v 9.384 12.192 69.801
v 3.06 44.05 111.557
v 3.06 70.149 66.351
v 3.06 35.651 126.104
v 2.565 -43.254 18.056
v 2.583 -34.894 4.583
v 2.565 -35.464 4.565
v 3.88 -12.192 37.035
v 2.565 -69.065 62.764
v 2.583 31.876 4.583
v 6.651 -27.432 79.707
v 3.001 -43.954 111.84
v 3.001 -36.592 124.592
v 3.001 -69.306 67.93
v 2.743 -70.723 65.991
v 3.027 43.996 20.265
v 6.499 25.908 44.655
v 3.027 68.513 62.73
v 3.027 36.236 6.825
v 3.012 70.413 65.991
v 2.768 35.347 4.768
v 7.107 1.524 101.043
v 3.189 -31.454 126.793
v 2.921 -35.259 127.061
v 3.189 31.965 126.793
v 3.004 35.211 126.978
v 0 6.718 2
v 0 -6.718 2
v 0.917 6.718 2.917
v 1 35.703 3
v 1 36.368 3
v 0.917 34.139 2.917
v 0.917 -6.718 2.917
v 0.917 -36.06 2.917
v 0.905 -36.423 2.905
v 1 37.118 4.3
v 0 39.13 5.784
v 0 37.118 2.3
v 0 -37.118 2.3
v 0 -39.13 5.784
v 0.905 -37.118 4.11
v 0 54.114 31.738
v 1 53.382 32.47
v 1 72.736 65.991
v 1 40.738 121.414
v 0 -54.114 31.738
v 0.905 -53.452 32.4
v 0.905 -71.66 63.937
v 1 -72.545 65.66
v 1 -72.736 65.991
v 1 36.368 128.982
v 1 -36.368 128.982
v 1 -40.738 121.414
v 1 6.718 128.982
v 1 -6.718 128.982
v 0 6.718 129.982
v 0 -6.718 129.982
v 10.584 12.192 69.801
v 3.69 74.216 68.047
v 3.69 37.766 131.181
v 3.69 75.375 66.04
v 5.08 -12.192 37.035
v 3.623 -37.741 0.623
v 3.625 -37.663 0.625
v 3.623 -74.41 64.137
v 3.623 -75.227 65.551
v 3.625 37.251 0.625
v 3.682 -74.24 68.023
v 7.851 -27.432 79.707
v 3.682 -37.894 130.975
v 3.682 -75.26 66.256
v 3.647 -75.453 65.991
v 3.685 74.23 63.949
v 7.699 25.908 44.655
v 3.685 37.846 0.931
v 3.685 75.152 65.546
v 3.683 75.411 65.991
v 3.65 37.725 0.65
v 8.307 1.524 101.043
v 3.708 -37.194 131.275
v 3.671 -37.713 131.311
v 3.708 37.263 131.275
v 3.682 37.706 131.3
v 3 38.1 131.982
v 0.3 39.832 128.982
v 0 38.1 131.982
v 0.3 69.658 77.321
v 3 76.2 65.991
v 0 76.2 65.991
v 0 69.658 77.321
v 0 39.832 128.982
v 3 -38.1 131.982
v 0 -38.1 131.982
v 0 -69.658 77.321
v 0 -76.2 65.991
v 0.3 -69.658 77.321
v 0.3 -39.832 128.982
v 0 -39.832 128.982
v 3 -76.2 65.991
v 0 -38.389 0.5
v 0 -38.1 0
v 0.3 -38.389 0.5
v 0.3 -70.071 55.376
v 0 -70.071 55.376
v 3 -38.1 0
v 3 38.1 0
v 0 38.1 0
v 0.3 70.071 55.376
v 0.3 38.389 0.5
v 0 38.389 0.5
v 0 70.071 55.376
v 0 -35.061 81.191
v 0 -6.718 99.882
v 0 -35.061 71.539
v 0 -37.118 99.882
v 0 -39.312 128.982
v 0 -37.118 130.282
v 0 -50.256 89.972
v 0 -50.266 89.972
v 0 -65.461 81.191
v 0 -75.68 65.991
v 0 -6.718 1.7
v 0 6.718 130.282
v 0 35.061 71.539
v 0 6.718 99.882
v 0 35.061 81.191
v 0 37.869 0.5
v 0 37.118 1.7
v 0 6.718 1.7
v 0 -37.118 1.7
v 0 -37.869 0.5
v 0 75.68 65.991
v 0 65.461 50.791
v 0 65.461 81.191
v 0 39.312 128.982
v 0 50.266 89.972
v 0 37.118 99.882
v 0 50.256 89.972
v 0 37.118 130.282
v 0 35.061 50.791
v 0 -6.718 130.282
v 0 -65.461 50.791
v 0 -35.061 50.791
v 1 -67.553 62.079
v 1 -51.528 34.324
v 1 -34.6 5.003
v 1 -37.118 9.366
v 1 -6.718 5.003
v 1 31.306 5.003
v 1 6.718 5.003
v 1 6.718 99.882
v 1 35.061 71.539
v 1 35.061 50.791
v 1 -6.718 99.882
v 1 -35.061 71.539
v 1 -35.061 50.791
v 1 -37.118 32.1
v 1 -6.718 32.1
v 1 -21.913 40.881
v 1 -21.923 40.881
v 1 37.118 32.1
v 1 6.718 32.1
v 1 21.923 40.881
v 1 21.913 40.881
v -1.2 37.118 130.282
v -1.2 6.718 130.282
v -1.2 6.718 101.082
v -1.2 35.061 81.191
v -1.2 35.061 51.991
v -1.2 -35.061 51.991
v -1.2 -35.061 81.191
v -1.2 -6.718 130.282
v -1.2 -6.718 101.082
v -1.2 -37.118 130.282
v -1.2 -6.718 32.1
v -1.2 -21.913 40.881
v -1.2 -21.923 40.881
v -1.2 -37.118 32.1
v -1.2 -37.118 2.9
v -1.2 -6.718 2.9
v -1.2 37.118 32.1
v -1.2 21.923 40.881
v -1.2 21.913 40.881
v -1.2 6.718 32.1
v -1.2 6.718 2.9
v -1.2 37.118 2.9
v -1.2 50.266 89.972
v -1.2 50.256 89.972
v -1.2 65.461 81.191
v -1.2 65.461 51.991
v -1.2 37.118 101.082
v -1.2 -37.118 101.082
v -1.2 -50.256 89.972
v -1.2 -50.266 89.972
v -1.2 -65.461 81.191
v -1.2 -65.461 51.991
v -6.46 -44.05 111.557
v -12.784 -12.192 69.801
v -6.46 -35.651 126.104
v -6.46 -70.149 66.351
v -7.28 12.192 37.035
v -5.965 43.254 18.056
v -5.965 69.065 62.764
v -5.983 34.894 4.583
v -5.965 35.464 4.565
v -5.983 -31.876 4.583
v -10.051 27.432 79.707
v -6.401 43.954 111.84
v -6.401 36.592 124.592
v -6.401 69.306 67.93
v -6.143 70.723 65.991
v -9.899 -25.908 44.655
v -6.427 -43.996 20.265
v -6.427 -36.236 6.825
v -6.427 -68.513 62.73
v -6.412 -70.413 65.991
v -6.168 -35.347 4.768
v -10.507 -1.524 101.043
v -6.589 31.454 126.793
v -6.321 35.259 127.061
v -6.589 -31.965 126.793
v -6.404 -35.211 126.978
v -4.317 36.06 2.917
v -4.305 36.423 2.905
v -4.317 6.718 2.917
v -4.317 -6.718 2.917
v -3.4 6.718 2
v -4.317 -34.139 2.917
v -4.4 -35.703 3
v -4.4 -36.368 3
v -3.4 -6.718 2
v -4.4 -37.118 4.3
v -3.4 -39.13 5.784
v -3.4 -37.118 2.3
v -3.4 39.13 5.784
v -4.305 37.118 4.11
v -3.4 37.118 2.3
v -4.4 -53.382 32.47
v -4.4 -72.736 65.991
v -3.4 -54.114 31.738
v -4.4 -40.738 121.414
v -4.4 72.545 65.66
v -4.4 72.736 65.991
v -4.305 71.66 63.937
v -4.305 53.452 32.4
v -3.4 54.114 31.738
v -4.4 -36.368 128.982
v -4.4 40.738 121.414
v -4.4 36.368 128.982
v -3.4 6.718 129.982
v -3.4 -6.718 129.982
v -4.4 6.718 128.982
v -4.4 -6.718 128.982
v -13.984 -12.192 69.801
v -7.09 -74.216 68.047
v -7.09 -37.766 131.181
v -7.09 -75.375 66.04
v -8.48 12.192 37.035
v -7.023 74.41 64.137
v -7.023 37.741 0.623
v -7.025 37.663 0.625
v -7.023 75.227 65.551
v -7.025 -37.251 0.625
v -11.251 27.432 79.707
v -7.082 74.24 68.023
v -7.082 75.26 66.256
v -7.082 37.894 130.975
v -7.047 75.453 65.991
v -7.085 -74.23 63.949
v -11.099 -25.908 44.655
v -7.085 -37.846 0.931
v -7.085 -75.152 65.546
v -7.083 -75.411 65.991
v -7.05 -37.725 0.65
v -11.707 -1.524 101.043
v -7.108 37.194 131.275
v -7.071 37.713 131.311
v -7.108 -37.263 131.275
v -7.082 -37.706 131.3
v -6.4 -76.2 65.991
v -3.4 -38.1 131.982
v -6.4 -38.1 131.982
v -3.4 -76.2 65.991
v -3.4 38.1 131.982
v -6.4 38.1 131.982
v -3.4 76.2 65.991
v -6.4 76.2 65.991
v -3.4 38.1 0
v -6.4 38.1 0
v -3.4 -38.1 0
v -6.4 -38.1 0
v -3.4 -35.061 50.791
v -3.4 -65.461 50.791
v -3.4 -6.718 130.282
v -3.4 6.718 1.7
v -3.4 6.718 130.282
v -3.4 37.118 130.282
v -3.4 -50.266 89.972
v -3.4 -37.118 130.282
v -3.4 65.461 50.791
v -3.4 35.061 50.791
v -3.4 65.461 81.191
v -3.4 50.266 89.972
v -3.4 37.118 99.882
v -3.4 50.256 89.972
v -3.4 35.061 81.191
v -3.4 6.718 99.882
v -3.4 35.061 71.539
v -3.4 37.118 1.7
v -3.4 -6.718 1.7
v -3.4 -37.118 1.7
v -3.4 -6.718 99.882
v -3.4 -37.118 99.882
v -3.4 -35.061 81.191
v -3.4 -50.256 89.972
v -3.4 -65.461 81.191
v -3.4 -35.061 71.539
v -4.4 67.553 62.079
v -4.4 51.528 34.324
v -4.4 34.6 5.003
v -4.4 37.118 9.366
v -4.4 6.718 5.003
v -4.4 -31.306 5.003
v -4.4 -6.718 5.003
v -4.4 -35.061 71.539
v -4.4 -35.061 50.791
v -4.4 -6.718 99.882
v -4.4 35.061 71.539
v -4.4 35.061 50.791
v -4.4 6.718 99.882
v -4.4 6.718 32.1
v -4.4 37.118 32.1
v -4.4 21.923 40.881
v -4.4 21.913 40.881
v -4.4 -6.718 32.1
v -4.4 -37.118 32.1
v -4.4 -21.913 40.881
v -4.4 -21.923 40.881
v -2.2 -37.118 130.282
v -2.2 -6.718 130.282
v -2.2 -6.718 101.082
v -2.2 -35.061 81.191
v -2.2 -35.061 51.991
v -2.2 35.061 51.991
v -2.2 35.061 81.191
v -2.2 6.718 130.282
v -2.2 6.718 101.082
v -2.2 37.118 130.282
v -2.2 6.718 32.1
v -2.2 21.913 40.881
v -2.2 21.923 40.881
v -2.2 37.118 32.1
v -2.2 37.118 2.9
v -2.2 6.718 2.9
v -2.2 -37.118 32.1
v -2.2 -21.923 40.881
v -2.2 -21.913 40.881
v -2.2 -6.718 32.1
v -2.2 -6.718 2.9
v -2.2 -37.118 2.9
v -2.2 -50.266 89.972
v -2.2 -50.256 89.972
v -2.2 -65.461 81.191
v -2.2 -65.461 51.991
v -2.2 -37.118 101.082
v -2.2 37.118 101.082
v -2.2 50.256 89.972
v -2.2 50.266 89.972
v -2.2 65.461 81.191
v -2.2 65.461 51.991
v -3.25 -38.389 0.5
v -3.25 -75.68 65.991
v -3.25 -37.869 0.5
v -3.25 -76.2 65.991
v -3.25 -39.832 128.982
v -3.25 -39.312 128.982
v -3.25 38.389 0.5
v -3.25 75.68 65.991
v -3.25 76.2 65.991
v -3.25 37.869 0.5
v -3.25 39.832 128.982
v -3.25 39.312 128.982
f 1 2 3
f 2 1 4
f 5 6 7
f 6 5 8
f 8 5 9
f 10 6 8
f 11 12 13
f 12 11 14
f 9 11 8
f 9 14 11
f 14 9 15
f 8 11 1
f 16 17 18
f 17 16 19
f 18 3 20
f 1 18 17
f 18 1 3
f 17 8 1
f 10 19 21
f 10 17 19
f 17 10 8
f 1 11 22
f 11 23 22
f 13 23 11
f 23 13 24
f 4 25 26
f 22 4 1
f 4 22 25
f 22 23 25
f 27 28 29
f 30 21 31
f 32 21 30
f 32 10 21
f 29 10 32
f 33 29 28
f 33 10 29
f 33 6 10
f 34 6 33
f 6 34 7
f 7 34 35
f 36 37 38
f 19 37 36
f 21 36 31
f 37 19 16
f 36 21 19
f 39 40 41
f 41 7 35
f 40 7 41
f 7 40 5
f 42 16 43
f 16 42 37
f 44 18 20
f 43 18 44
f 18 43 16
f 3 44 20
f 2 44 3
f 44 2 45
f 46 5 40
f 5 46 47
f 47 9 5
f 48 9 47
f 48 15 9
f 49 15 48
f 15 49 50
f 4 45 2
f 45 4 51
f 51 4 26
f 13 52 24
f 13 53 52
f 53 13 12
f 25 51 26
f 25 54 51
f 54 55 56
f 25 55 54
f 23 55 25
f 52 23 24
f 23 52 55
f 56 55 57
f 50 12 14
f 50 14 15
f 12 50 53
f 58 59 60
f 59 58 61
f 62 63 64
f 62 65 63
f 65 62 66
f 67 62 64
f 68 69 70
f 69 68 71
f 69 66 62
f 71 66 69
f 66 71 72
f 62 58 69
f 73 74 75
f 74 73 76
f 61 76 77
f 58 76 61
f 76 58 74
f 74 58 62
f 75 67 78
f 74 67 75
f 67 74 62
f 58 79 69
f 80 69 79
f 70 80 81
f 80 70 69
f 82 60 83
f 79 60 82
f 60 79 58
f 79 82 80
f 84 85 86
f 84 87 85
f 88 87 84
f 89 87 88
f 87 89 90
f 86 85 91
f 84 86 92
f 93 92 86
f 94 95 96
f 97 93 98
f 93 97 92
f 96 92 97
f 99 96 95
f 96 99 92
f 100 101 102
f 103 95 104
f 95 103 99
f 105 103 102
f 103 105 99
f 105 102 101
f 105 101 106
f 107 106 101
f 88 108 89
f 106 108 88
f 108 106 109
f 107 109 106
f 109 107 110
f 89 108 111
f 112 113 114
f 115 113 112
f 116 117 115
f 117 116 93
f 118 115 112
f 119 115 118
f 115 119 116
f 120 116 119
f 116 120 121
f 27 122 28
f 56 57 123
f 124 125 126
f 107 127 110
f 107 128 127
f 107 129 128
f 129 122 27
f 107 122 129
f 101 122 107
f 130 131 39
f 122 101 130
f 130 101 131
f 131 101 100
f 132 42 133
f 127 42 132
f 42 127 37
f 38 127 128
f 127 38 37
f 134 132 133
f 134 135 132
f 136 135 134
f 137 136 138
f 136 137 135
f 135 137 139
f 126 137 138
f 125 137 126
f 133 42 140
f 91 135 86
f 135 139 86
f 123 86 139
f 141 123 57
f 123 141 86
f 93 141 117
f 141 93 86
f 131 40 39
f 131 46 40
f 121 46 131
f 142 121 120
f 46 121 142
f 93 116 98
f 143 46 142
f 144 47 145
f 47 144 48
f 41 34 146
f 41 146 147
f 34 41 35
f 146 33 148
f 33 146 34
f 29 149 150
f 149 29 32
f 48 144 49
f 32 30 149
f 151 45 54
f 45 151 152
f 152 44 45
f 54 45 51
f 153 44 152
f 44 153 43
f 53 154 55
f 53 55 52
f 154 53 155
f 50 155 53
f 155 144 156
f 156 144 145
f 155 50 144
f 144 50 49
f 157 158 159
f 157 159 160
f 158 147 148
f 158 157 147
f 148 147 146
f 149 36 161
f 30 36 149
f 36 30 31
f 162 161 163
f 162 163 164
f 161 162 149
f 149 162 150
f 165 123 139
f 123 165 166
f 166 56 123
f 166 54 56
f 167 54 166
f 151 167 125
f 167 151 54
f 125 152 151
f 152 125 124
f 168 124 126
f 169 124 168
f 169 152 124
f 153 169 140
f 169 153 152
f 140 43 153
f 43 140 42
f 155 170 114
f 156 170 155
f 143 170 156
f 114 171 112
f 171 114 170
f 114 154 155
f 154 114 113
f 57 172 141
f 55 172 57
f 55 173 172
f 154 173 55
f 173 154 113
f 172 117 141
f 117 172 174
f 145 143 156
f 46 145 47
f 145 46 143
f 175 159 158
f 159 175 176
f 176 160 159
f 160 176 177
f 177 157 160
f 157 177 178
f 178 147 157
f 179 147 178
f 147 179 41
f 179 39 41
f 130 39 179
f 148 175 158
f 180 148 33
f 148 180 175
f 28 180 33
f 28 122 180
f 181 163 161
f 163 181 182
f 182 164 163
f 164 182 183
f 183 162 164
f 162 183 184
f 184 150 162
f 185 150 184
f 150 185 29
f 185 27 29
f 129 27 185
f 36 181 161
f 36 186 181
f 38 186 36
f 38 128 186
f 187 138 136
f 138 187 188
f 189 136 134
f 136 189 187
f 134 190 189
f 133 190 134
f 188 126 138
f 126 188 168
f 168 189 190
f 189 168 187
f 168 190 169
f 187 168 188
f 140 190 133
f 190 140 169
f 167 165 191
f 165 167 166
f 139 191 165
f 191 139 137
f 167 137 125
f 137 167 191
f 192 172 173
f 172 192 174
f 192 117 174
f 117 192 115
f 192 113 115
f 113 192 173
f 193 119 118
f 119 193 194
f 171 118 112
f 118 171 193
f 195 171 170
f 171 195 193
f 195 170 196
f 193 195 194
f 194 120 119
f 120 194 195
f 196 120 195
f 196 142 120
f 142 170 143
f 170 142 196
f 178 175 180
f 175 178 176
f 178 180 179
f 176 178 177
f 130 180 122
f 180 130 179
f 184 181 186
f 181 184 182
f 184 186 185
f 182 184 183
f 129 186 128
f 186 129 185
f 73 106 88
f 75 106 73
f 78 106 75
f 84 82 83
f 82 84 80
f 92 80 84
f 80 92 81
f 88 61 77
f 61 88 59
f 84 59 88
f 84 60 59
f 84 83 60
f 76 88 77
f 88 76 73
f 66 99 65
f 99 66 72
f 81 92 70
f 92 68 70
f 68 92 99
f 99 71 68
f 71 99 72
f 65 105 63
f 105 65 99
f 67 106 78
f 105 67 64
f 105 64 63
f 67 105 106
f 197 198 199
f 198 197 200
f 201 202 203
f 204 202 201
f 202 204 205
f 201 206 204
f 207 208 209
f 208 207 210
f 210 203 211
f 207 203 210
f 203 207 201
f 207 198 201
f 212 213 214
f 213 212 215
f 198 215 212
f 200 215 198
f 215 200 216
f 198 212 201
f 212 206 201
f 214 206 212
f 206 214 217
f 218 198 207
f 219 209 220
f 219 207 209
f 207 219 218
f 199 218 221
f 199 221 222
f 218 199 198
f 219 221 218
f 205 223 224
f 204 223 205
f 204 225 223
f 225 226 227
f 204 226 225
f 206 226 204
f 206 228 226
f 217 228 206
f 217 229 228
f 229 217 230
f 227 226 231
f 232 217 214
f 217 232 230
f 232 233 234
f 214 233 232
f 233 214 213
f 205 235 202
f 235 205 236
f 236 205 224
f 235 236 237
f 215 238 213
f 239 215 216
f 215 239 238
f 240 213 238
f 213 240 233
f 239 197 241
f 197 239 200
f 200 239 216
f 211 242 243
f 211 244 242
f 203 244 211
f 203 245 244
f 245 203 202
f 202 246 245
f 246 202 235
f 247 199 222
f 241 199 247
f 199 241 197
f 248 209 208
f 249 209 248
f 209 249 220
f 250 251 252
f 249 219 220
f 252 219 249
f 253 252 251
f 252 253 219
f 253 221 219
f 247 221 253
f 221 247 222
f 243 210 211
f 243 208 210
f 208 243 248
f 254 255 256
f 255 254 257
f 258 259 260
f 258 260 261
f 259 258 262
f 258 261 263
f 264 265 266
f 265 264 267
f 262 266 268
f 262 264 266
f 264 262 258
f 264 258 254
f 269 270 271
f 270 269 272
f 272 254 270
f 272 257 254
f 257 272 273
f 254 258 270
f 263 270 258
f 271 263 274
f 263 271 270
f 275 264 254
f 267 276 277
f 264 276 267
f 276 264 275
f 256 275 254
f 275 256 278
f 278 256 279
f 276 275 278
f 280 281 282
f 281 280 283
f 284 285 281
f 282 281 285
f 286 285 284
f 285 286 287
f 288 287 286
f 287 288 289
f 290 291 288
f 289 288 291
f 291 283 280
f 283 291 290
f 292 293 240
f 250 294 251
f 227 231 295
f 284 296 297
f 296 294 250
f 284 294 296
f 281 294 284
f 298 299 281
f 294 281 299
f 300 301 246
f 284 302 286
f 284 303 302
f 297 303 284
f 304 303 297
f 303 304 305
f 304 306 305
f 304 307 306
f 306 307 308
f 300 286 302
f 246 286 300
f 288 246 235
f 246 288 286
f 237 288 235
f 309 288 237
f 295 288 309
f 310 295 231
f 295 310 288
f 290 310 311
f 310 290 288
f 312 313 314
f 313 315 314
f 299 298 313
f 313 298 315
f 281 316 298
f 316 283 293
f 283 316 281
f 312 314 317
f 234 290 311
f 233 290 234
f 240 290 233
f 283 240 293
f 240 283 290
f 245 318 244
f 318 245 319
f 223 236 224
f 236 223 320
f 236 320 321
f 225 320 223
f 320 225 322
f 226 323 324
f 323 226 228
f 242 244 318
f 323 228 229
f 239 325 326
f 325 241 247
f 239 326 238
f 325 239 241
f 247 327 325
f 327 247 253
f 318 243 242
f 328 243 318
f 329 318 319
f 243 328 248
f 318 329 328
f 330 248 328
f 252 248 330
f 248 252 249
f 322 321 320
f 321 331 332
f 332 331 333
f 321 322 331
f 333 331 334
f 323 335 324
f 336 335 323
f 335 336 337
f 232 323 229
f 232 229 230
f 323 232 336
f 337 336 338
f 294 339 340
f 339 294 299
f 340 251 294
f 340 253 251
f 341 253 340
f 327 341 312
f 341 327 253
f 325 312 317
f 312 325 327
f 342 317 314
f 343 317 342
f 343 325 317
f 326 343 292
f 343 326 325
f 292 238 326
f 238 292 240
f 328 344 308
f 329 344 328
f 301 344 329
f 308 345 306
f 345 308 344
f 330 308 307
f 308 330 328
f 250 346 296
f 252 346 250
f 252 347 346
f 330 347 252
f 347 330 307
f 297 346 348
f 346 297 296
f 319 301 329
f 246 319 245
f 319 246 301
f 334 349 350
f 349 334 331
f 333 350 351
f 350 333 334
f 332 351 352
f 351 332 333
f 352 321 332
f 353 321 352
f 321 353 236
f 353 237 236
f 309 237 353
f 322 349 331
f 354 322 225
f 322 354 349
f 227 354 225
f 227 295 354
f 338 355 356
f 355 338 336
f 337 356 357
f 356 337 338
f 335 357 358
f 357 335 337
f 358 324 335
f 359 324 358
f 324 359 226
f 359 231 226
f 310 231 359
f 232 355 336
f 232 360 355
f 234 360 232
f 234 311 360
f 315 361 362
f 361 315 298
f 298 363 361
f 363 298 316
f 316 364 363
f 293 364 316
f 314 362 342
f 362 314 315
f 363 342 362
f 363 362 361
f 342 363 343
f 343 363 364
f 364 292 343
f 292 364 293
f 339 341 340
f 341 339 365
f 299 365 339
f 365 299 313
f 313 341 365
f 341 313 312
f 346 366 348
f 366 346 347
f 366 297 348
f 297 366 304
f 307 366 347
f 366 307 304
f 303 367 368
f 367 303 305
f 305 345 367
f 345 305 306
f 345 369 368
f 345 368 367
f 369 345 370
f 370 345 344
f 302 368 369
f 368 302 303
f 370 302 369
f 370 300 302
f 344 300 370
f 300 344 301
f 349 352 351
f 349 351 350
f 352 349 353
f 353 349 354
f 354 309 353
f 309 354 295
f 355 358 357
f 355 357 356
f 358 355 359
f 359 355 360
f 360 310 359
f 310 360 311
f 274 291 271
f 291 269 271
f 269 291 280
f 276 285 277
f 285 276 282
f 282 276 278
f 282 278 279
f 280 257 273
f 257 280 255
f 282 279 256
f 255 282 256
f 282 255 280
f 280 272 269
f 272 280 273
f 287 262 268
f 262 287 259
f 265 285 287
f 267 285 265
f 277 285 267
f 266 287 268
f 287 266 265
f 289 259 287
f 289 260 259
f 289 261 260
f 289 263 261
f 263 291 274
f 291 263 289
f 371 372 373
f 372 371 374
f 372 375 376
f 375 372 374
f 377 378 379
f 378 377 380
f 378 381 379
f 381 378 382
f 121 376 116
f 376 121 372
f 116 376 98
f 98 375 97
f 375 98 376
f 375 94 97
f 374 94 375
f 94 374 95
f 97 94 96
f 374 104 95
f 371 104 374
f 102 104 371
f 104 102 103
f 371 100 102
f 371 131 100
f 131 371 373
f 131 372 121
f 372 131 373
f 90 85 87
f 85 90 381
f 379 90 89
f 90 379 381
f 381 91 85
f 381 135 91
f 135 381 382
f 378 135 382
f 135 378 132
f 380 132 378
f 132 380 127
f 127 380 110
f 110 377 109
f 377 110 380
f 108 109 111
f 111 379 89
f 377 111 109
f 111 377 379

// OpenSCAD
// Hexagon wall tile v51 — parametric rebuild of v30
// Front: identical low-poly facets to v30 (same facet angles at every size).
// Edge profile: identical on every size (edge depth, rim width) so tiles butt flush.
// Back: six corner pads for 1" (25 mm) double-sided mounting tape.
// v32: tape pads are flat plates hung from the rim with an air gap to the front skin.
// v33: thinner skin + thinner pads so the air gap is 1.4 mm even right at the edges
//      (v32 had only 0.8 mm there and showed marks along the slanted edges).
// v34: snap-off stabilizer fins behind the bottom edge so the tall, thin tile can't tip over
//      while printing. Break them off afterwards (bend sideways) and the back stays flat.
// v35: 0.6 mm 45° chamfer on the front edge (crisp, consistent shadow line between tiles; hides
//      first-layer squish and brim trim marks) + relief_scale to deepen the facets if wanted.
// v37: much smaller breakaway tabs (0.8 x 0.6 mm, every 8 mm) so the fins snap off easily.
// v38: full-height snap-off BRACE FRAME behind the tile: a thin hex ring + X/vertical bars,
//      1 mm behind the back, tied to the tile rim by tiny tabs all the way round (incl. the top).
//      Tile + brace act as a stiff box while printing; the fins now sit on the brace.
//      Peel the brace off after printing — the tabs only touch the back rim.
// v39: PAIR mode (default): two identical tiles printed back-to-back, 0.4 mm apart, so each
//      cradles the other full-height. Only 12 tiny tabs (corners + mid-sides) join the back
//      rims — twist/peel the tiles apart. No brace, no fins, almost no waste. The pair is
//      turned 90° on the bed so the 'back' seam lands on a side edge, not on either face.
// v40: pair tabs spaced evenly every ~pair_tab_pitch mm round the rim on EVERY size. In v39 the
//      tab spacing grew with the tile (3": ~23 mm max gap, 6": ~46 mm, 10": ~79 mm), so the 3" pair
//      printed perfectly but the 6" rims flexed apart between tabs and broke up above mid-height.
//      Now every size has the same tab spacing as a stiff 3" pair (or tighter).
// v42: tabs replaced by one continuous hairline SEAM round the outer edge of the pair gap.
//      Discrete tabs changed the toolpath on every layer that had a tab, leaving a faint line
//      across the tile every ~10 mm of height. With a continuous seam every layer has the same
//      shape, so there is nothing to print differently. Separate the tiles by running a utility
//      knife along the seam line on the edges, then twist apart.
// v43: stiffer tape pads — each pad now grows from the back plane toward the front until it is
//      pad_gap (1.4 mm) from the skin, instead of being a 1 mm plate (the skin stays untouched, so
//      no ghost lines). Larger tiles (>= mid_pad_min_in)
//      get four extra pads at the slanted mid-edges: 10 tape spots on the 10".
// v44: UNIFORM pads. Every pad is the same PAD x PAD tape square, pushed snug into its corner
//      (touching both rims), with only a small 45° gusset beneath it down to the rim so it prints
//      without support. Because a hex corner is the same angle at every size, the 6" and 10" pads
//      are identical in shape and size; the 3" uses the same layout with smaller squares.
//      The 10" adds the same square at the middle of each slanted edge.
// v46: pads are a 1 mm plate with a stiffening LIP round the free edges (like a shallow tray),
//      instead of solid-filled — nearly the stiffness of v44's deep pads at close to v42 print time.
// v47: pair gap 0.4 -> 1.0 mm. At 0.4 mm the squashed back walls of the two tiles touched and
//      fused, so v42-v46 pairs would not come apart. At 1.0 mm only the hairline edge seam joins
//      them: cut it with a utility knife (there is now room for the blade) and they separate.
// v48: seam only on the four SLANTED edges. The top and bottom flat edges are left open (a 1 mm
//      slot), so a putty knife / flat screwdriver can go in and pry the pair open, unzipping the
//      seam. Every layer still crosses the seam at both ends, so the layer shape stays constant.
// v49: "KISS" seam — the seam is printed on ONE tile only and stops seam_kiss short of the other
//      tile's back. The two tiles are never one solid: they only touch where the plastic squashes
//      out, which tacks them lightly (enough to steady them while printing, weak enough to snap by
//      hand). Set seam_kiss = 0 to go back to the fused v48 seam.
// v50: (1) every tape pad gets a 45° pointed top, so pads taper out over many layers instead of
//      ending on one layer. Abrupt pad ends changed the layer time suddenly and left a line across
//      the face (seen at ~14% and ~36% height on the 10").
//      (2) the stiffening lips stay lip_gap (2.5 mm) clear of the skin, not 1.4: near the edges the
//      lips were hugging the skin and ghosting through as ridges parallel to the edge.
// v51: STIFFER, LARGER TAPE PADS without touching the front edge profile:
//      - each tape SQUARE stands pad_proud (1.2 mm) proud of the back rim, so where the tape goes
//        the pad is ~2.2 mm thick (was 1 mm) — roughly 8-10x stiffer. The tile sits on its pads;
//        the rim floats ~1.2 mm + tape thickness off the wall. Support webs stay thin (print time).
//      - pads 30 mm square (fit 1" tape with margin), with a shallow 30° roof instead of a point.
//      - front kept cleaner: pads now stay pad_gap = 1.6 mm from the skin; no lips.
//      - pair gap grows to keep 1 mm between the two tiles' proud pads.
//      - seam now starts right at the bottom corners (no cantilevered start); pry slot along the top.
// Prints upright on a flat edge with NO supports (every downward edge is 45° or steeper).
//
// Export one size at a time, e.g.:
//   openscad -D size_in=6 -o hex_pair_v51_6in.stl hex_wall_tile_v51.scad

/* [Size] */
size_in       = 6;      // point-to-point width in inches (3, 6, 10 ...)

/* [Edge profile — keep identical across sizes] */
// Space behind the skin at the edge = edge_depth - skin; it must be >= pad_plate + pad_gap + pad_recess.
edge_depth    = 3.6;    // depth of the outer edge, back plane to front face (mm)
rim           = 2.0;    // perimeter wall thickness at the back plane (mm)
front_chamfer = 0.6;    // 45° chamfer on the front edge (mm); 0 = sharp edge

/* [Look] */
relief_scale  = 1.0;    // 1.0 = v30 facets; 1.5 = 50% deeper facets (same edge profile on all sizes)

/* [Front skin] */
skin          = 1.2;    // front skin thickness (mm) — 3 lines at 0.4 mm, same on all sizes

/* [Tape pads] */
tape_width    = 25.4;   // tape width (mm)
pad_margin    = 5;      // extra pad width beyond the tape (mm) -> 30.4 mm pads
pad_max_frac  = 0.45;   // pad never larger than this fraction of the tile radius (keeps 3" usable)
pad_plate     = 1.0;    // pad thickness in front of the back plane (mm), less where the skin is close
pad_proud     = 1.2;    // pads stand this far behind the back rim (mm) -> extra stiffness, no effect on the front
roof_angle    = 30;     // slope of the pad tops (deg) — tapers the pad end over several mm of height
pad_depth     = 0;         // stiffening lip depth (mm); always stops pad_gap from the skin
lip_gap       = 2.5;    // lips stop this far from the skin (plates keep pad_gap)
pad_lip       = 0.9;    // lip thickness (mm) — two lines
mid_pad_min_in = 8;     // tiles this size or larger also get pads at the four slanted mid-edges
pad_gap       = 1.6;    // minimum air gap between pads and the front skin (mm) — keeps the front clean
pad_recess    = 0;      // pads set back from the rim (mm); >0 lets the rim touch the wall,
                        // but near the edges the plate is then trimmed thinner to keep pad_gap

/* [Print stabilizers (snap off after printing)] */
stabilizers   = false;  // v34-v38 option; not needed in pair mode
fin_count     = 2;      // fins behind the bottom edge, placed symmetrically
fin_thick     = 1.6;    // fin thickness (mm)
fin_height_frac = 0.35; // fin height as a fraction of the tile height
fin_depth_frac  = 0.4;  // fin depth behind the brace as a fraction of fin height
fin_depth_min   = 15;   // (mm)
fin_gap       = 0.5;    // air gap between fin and tile back (mm)
tab_height    = 0.6;    // breakaway tab height (mm, vertical when printing) — 3 layers at 0.2
tab_width     = 0.8;    // breakaway tab width (mm), centred on the fin — 2 lines
tab_pitch     = 8;      // spacing between tabs (mm)

/* [Full-height brace frame (snap off after printing)] */
brace         = false;  // v38 option; not needed in pair mode
brace_gap     = 1.0;    // air gap between tile back and brace (mm)
brace_thick   = 1.6;    // brace thickness (mm)
brace_rim_w   = 4;      // width of the brace's hex ring (mm)
brace_bar_w   = 3;      // width of the X and vertical bars (mm)
brace_tab_pitch = 10;   // spacing of brace tabs along each rim side (mm)
brace_tab     = 0.8;    // brace tab size (mm) — tiny, so the brace peels off

/* [Back-to-back pair (default)] */
pair          = true;
pad_clear     = 1.0;    // air between the two tiles' proud pads (mm)
pair_gap      = pad_clear + 2*pad_proud;   // gap between the two back planes (mm)
pair_tab      = 0.6;    // tab size (mm) — tiny, so the pair twists apart
pair_tab_pitch = 12;    // (v40 tabs, unused when pair_seam_w > 0)
pair_seam_w   = 0.45;   // width of the continuous edge seam bridging the gap (mm) — about one line
seam_kiss     = 0.15;   // gap between the seam tip and the other tile (mm); 0 = fused seam
seam_open     = 3;      // leave the seam off this far from the top and bottom flat edges (mm) -> pry slots

/* [Output] */
orient_for_print = true; // stand upright on a flat edge, back facing +Y

/* [Hidden] */
R   = size_in * 25.4 / 2;         // corner radius
AP  = R * cos(30);                // apothem
PAD = min(tape_width + pad_margin, R * pad_max_frac);

// Normalised front geometry from v30 (x, y in units of R; z = relief above edge, units of R)
FP = [[1,0,0],[0.5,0.866025,0],[-0.5,0.866025,0],[-1,0,0],[-0.5,-0.866025,0],[0.5,-0.866025,0],
      [0.16,0.05,0.091654],[-0.16,-0.38,0.019428],[-0.36,0.18,0.05579],[0.34,-0.28,0.053795],[0.02,0.46,0.061766]];
FACES = [[0,6,1],[4,3,7],[5,4,7],[8,3,2],[7,3,8],[7,8,6],[5,9,0],[9,6,0],[9,7,6],[5,7,9],
         [6,8,10],[8,2,10],[6,10,1],[10,2,1],
         [1,12,11,0],[2,13,12,1],[3,14,13,2],[4,15,14,3],[5,16,15,4],[0,11,16,5],
         [11,12,13,14,15,16]];
RELIEF_MAX = 0.091654 * R * relief_scale;
D = edge_depth + RELIEF_MAX + 1;  // max depth used for chamfers

// Solid bounded by the faceted front (shifted by dz) and a flat back at z = zb
module body(dz = 0, zb = 0) {
    pts = concat(
        [for (p = FP) [p[0]*R, p[1]*R, edge_depth + p[2]*R*relief_scale + dz]],
        [for (i = [0:5]) [FP[i][0]*R, FP[i][1]*R, zb]]);
    polyhedron(points = pts, faces = FACES, convexity = 4);
}

module hex2d(apothem) { circle(r = apothem / cos(30), $fn = 6); }

// Back cavity: behind the skin, inside the rim; rim inner faces slope 45° so nothing needs support
module cavity(extra = 0) {
    H  = D + 2;
    a0 = AP - rim - extra + 1;             // apothem at z = -1
    intersection() {
        body(dz = -skin - extra, zb = -1);
        translate([0, 0, -1]) linear_extrude(height = H, scale = (a0 - H) / a0) hex2d(a0);
    }
}

// ---- Uniform tape pads ----------------------------------------------------------------
PA = AP - rim + 0.3;                    // inner apothem used for pads (0.3 mm overlap fuses them to the rim)
PH = PAD / 2;
function nrm(a) = [cos(a), sin(a)];
function lim(a) = PA - PH * (abs(cos(a)) + abs(sin(a)));     // max n.c for an axis-aligned PAD square
// centre of a PAD square snug in the corner at angle t (touches the two rims meeting there)
function corner_c(t) = let(n1 = nrm(t - 30), n2 = nrm(t + 30), b1 = lim(t - 30), b2 = lim(t + 30), d = sin(60))
    [(b1*n2[1] - b2*n1[1]) / d, (n1[0]*b2 - n2[0]*b1) / d];
// centre of a PAD square snug against the middle of the edge whose normal is at angle a
function edge_c(a) = lim(a) * nrm(a);
// downward 45° (or vertical) gusset direction toward the nearest rim below — printed upright, model -y is down
function gdir(t) = (cos(t) > 0.1) ? [1, -1] : (cos(t) < -0.1) ? [-1, -1] : [0, -1];

module pad_sq(c, dir) {
    intersection() {
        hex2d(PA);
        hull() {
            translate(c) square(PAD, center = true);
            translate(c + [0, PAD/2 + PAD/2*tan(roof_angle)]) square(0.01, center = true);   // shallow roof
            translate(c + dir * R) square(PAD, center = true);
        }
    }
}
module pad_fp(k)  { t = 60*k;      pad_sq(corner_c(t), (k == 4 || k == 5) ? [0, -1] : gdir(t)); }
module mid_fp(k)  { a = 30 + 60*k; pad_sq(edge_c(a),   (k == 3 || k == 5) ? [0, -1] : gdir(a)); }

module pad_fps() {
    for (k = [0:5]) pad_fp(k);
    if (size_in >= mid_pad_min_in) for (k = [0, 2, 3, 5]) mid_fp(k);
}
// proud part of one tape square: only the square itself (not its support web), with a 45° ramp
// at its lower edge so, printed upright, it grows out of the plate instead of starting as a ledge
module proud_sq(c) {
    intersection() {
        translate([0, 0, -pad_proud]) linear_extrude(pad_proud + 0.01)
            intersection() {
                hex2d(PA);
                hull() { translate(c) square(PAD, center = true);
                         translate(c + [0, PAD/2 + PAD/2*tan(roof_angle)]) square(0.01, center = true); }
            }
        translate([0, c[1] - PAD/2, 0])
            multmatrix([[1,0,0,0],[0,1,-1,0],[0,0,1,0]]) translate([-2*R, 0, -5]) cube([4*R, 4*R, 10]);
    }
}
module pads() {
    intersection() {                                       // tape plate in front of the back plane, pad_gap from the skin
        body(dz = -skin - pad_gap, zb = -1);
        linear_extrude(pad_plate) pad_fps();
    }
    for (k = [0:5]) proud_sq(corner_c(60*k));              // stiff proud tape squares behind it
    if (size_in >= mid_pad_min_in) for (k = [0, 2, 3, 5]) proud_sq(edge_c(30 + 60*k));
}

module chamfer_clip() {
    HB = D + 5;
    union() {
        translate([0, 0, -2]) linear_extrude(edge_depth - front_chamfer + 2) hex2d(AP + 1);
        translate([0, 0, edge_depth - front_chamfer]) linear_extrude(height = HB, scale = (AP - HB) / AP) hex2d(AP);
    }
}

module tile() {
    intersection() {
        union() {
            difference() { body(); cavity(); }
            pads();
        }
        if (front_chamfer > 0) chamfer_clip(); else translate([-2*R, -2*R, -5]) cube([4*R, 4*R, 4*R]);
    }
}

// Triangular fins standing on the bed behind the back (model z < 0), joined to the tile by small tabs
FIN_H = fin_height_frac * 2 * AP;
FIN_L = max(fin_depth_min, fin_depth_frac * FIN_H);
function fin_x(i) = (fin_count == 1) ? 0 : (-1 + 2 * i / (fin_count - 1)) * 0.35 * R;
BZ = brace ? brace_gap + brace_thick : 0;          // fins start behind the brace when it is used
module stabilizer_fins() {
    for (i = [0 : fin_count - 1]) {
        x = fin_x(i);
        fg = brace ? BZ - 0.3 : fin_gap;                // with a brace: fused into it (no tabs needed)
        hull() {                                            // fin: vertical triangle
            translate([x - fin_thick/2, -AP, -fg - FIN_L]) cube([fin_thick, 0.01, FIN_L]);
            translate([x - fin_thick/2, -AP, -fg - 0.01]) cube([fin_thick, FIN_H, 0.01]);
        }
        if (!brace)
            for (y = [0 : tab_pitch : FIN_H - tab_height])  // breakaway tabs into the back plane
                translate([x - tab_width/2, -AP + y, -fin_gap - 0.05]) cube([tab_width, tab_height, fin_gap + 0.35]);
    }
}

// Brace frame (2D, in the tile plane). Printed upright, so every downward-facing edge is >= 45°:
// the top bar is carried by 45° roofs in the two top windows; bars run vertical or at ±60°.
module brace_2d() {
    W  = brace_rim_w;
    Yt = AP - W;                                        // underside of the top ring bar
    difference() {
        hex2d(AP);
        intersection() {                                // the open window, with a 45° roof under the top bar
            hex2d(AP - W);
            // only the two top windows touch the top bar: give them a 45° valley roof
            polygon([[-2*R, -2*R], [2*R, -2*R], [2*R, 2*R], [R/2, 2*R], [R/2, Yt],
                     [0, Yt - R/2], [-R/2, Yt], [-R/2, 2*R], [-2*R, 2*R]]);
        }
    }
    intersection() {
        hex2d(AP);
        union() {
            square([brace_bar_w, 2*AP], center = true);                 // vertical bar
            rotate(60)  square([4*R, brace_bar_w], center = true);      // ±60° diagonals (corner to corner)
            rotate(-60) square([4*R, brace_bar_w], center = true);
        }
    }
}

module brace_frame() {
    translate([0, 0, -BZ]) linear_extrude(brace_thick) brace_2d();
    // tiny tabs across the gap, on the tile's back rim (1 mm in from the outline), all six sides
    for (k = [0:5]) {
        a0 = 60*k; a1 = 60*(k+1);
        p0 = [ (R - 1/sin(60)) * cos(a0), (R - 1/sin(60)) * sin(a0) ];
        p1 = [ (R - 1/sin(60)) * cos(a1), (R - 1/sin(60)) * sin(a1) ];
        L  = norm(p1 - p0);
        n  = floor((L - 6) / brace_tab_pitch);
        for (j = [0 : n]) {
            t = (3 + j * (L - 6) / max(n, 1)) / L;
            p = p0 + t * (p1 - p0);
            translate([p[0], p[1], -brace_gap - 0.3]) rotate(a0 + 120)
                translate([-brace_tab/2, -brace_tab/2, 0]) cube([brace_tab, brace_tab, brace_gap + 0.6]);
        }
    }
}

// Tabs across the pair gap, evenly spaced along each rim side (1 mm in from the outline)
module pair_tabs() {
    rr = R - 1/sin(60);
    n  = max(2, ceil(rr / pair_tab_pitch));          // side length = rr
    for (k = [0:5]) for (i = [0:n-1]) {
        f  = (i + 0.5) / n;
        a0 = 60*k; a1 = 60*(k+1);
        p = [rr*cos(a0), rr*sin(a0)] + f * ([rr*cos(a1), rr*sin(a1)] - [rr*cos(a0), rr*sin(a0)]);
        translate([p[0], p[1], -pair_gap - 0.3]) rotate(a0 + 120)
            translate([-pair_tab/2, -pair_tab/2, 0]) cube([pair_tab, pair_tab, pair_gap + 0.6]);
    }
}
// Continuous hairline seam round the outline, bridging the gap between the two back planes
module pair_seam() {
    z0 = (seam_kiss > 0) ? -pair_gap + seam_kiss : -pair_gap - 0.3;      // kiss: stops short of the partner
    translate([0, 0, z0]) linear_extrude(0.3 - z0)
        intersection() {
            difference() { hex2d(AP); hex2d(AP - pair_seam_w); }
            translate([-2*R, -AP + pair_seam_w + 0.05]) square([4*R, 2*AP - pair_seam_w - 0.05 - seam_open]);
            // slanted edges only, from just off the bed (bottom corners) up to the top pry slot
        }
}
module partner() { translate([0, 0, -pair_gap]) rotate([0, 180, 0]) tile(); }   // same tile turned round, not mirrored

module assembly() {
    tile();
    if (pair) { partner(); if (pair_seam_w > 0) pair_seam(); else pair_tabs(); }
    else { if (brace) brace_frame(); if (stabilizers) stabilizer_fins(); }
}

if (orient_for_print)
    rotate([0, 0, pair ? 90 : 0]) translate([0, 0, AP]) rotate([90, 0, 0]) assembly();
else
    assembly();
